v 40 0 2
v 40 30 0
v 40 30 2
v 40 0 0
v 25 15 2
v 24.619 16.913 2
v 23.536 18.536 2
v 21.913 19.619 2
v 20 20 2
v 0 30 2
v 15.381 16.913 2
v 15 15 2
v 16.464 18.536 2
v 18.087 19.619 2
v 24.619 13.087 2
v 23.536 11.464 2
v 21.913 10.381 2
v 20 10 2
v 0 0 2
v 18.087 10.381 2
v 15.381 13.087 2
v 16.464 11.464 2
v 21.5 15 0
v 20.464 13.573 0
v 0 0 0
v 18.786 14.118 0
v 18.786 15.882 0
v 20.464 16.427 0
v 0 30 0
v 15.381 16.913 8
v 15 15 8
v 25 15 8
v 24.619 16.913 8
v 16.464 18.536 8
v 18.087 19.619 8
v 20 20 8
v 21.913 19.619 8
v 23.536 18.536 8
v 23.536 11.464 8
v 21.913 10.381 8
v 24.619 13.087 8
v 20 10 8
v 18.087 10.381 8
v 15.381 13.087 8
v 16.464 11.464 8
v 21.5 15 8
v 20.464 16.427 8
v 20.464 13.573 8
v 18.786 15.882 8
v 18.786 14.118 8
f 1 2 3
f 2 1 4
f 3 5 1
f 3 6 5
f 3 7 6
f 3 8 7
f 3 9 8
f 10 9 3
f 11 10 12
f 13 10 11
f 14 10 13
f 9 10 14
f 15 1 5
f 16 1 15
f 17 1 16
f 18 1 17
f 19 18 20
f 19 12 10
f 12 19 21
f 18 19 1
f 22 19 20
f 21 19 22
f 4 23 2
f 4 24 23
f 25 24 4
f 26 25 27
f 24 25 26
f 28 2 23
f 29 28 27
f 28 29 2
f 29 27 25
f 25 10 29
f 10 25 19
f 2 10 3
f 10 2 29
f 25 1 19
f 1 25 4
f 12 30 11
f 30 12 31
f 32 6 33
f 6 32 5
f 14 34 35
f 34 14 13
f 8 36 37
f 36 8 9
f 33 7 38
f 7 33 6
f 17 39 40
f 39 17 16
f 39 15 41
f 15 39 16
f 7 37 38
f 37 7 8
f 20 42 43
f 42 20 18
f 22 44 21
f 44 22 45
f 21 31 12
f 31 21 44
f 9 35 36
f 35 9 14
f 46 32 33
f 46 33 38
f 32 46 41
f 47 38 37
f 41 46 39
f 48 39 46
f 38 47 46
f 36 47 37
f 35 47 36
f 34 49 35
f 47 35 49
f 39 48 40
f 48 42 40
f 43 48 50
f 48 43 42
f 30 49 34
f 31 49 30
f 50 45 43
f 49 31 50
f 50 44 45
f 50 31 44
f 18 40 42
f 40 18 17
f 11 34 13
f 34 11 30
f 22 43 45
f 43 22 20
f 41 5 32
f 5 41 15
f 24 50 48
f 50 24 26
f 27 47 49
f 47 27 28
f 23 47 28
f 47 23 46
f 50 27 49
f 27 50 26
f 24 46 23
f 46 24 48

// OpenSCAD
difference() {
  union() {
    cube([40, 30, 2]);
    translate([20, 15, 2]) cylinder(d=10, h=6);
  }
  translate([20, 15, -1]) cylinder(d=3, h=10);
}
